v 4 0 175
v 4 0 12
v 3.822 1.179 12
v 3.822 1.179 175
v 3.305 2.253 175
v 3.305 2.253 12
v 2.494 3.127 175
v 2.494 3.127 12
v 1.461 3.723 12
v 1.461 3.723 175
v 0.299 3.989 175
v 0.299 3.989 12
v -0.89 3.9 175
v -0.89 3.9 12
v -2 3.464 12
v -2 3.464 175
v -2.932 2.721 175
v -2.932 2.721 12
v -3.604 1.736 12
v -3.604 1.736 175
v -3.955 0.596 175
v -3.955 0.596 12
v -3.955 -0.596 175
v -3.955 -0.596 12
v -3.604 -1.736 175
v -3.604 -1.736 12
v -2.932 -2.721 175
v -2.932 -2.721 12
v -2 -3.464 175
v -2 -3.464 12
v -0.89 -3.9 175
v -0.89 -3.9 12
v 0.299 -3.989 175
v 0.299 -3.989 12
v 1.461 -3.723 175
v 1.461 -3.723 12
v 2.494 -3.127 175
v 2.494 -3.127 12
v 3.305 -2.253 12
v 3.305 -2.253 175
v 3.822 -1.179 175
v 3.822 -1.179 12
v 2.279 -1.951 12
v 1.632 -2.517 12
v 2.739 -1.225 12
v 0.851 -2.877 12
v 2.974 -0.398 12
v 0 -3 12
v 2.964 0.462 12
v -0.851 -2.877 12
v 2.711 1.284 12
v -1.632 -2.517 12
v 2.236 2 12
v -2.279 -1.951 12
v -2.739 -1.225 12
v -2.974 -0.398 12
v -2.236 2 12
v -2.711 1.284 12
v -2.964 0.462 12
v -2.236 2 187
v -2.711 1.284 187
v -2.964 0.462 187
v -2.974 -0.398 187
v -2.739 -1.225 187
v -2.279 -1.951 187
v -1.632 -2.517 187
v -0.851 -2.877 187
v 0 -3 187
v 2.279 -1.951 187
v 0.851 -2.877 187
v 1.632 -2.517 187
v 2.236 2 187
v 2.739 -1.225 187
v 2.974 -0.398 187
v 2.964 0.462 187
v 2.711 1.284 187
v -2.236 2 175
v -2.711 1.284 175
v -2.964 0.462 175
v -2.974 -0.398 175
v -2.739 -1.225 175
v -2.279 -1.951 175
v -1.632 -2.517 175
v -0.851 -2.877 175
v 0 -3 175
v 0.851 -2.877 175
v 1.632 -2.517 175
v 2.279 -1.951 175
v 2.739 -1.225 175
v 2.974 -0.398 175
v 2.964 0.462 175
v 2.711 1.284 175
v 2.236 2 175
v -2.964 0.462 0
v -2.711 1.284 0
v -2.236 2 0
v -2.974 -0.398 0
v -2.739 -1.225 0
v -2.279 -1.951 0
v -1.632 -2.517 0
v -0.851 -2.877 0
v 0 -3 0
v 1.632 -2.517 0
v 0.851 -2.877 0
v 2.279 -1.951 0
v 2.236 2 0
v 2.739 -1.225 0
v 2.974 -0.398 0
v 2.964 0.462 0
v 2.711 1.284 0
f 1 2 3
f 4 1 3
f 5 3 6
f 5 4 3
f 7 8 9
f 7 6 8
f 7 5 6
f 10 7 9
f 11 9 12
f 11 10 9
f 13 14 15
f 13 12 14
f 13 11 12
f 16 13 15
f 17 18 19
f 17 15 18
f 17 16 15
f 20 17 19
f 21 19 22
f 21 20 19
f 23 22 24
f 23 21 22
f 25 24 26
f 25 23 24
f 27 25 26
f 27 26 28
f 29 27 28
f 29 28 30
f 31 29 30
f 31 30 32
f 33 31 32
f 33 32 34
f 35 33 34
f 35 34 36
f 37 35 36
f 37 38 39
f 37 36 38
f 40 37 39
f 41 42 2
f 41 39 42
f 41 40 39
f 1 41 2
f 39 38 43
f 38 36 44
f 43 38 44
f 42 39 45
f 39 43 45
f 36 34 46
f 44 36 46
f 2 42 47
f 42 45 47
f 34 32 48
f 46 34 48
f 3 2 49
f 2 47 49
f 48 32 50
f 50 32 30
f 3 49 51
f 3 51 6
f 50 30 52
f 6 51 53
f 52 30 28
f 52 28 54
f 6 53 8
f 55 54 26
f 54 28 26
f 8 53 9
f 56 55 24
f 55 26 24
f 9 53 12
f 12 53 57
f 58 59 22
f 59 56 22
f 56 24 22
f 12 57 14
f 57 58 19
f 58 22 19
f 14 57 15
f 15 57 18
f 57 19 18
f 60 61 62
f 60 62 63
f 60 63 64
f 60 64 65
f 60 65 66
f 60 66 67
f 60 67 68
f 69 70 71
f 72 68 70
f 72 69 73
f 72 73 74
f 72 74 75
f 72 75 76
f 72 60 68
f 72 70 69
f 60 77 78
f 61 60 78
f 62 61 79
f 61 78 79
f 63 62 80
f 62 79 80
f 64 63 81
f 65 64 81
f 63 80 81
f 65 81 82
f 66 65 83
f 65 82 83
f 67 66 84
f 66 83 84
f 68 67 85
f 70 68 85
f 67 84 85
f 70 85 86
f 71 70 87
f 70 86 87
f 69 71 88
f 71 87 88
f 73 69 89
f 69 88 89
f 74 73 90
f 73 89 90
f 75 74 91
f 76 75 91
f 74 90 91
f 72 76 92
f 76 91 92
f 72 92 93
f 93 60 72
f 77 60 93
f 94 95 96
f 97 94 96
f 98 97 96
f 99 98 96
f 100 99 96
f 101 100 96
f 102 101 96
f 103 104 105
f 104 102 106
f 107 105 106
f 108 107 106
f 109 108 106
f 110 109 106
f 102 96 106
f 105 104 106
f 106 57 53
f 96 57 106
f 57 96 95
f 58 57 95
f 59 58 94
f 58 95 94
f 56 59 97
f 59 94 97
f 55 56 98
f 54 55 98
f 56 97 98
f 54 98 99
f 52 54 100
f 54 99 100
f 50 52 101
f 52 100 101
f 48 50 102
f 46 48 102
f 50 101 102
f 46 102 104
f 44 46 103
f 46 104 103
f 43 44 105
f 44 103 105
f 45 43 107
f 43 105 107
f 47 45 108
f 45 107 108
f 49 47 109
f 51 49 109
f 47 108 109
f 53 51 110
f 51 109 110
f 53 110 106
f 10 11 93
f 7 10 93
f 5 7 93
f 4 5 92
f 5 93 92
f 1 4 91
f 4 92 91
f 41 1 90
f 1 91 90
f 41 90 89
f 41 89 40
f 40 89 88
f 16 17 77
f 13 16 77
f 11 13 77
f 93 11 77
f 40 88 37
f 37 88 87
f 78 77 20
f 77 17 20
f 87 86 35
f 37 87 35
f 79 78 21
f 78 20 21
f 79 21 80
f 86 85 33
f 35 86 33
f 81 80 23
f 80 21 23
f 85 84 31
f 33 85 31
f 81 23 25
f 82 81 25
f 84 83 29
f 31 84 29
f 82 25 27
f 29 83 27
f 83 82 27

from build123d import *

# Parameters (mm, degrees)
ESBO_O1_R                  = 6.35
RESSALTO_EXTRUS_O1_DEPTH   = 187
ESBO_O2_R                  = 12.7
ESBO_O2_R_2                = 4
CORTE_EXTRUS_O1_DEPTH      = 188.215504166
CORTE_EXTRUS_O2_DEPTH      = 188.085541932
CORTE_EXTRUS_O2_DEPTH_BACK = 188.085541932
ESBO_O3_W                  = 12
ESBO_O3_H                  = 10
ESBO_O5_W                  = 12
ESBO_O5_H                  = 10


with BuildPart() as part:
    # Esboço1 → Ressalto-extrusão1 (new body)
    with BuildSketch(Plane.XY):
        Circle(ESBO_O1_R)
    extrude(amount=RESSALTO_EXTRUS_O1_DEPTH)

    # Esboço2 → Corte-extrusão1 (cut, through all)
    with BuildSketch(Plane.XY.offset(187)):
        Circle(ESBO_O2_R)
        Circle(ESBO_O2_R_2, mode=Mode.SUBTRACT)
    extrude(amount=-CORTE_EXTRUS_O1_DEPTH, mode=Mode.SUBTRACT)

    # Esboço3 → Corte-extrusão2 (cut, two sides: drawn at the far end of the back side and taken through both)
    with BuildSketch(Plane(origin=(0, 0, 0), x_dir=(0, 0, -1), z_dir=(1, 0, 0)).offset(-CORTE_EXTRUS_O2_DEPTH_BACK)):
        with Locations((-181, 7)):
            Rectangle(ESBO_O3_W, ESBO_O3_H)
        with Locations((-6, 7)):
            Rectangle(ESBO_O3_W, ESBO_O3_H)
    extrude(amount=CORTE_EXTRUS_O2_DEPTH + CORTE_EXTRUS_O2_DEPTH_BACK, mode=Mode.SUBTRACT)

    # Esboço5 → Corte-Revolução2 (revolve, cut)
    with BuildSketch(Plane(origin=(0, 0, 0), x_dir=(0, 0, -1), z_dir=(1, 0, 0))):
        with Locations((-181, 8)):
            Rectangle(ESBO_O5_W, ESBO_O5_H)
        with Locations((-6, 8)):
            Rectangle(ESBO_O5_W, ESBO_O5_H)
    revolve(axis=Axis((0, 0, 0), (0, 0, 1)), mode=Mode.SUBTRACT)


solid = part.part
